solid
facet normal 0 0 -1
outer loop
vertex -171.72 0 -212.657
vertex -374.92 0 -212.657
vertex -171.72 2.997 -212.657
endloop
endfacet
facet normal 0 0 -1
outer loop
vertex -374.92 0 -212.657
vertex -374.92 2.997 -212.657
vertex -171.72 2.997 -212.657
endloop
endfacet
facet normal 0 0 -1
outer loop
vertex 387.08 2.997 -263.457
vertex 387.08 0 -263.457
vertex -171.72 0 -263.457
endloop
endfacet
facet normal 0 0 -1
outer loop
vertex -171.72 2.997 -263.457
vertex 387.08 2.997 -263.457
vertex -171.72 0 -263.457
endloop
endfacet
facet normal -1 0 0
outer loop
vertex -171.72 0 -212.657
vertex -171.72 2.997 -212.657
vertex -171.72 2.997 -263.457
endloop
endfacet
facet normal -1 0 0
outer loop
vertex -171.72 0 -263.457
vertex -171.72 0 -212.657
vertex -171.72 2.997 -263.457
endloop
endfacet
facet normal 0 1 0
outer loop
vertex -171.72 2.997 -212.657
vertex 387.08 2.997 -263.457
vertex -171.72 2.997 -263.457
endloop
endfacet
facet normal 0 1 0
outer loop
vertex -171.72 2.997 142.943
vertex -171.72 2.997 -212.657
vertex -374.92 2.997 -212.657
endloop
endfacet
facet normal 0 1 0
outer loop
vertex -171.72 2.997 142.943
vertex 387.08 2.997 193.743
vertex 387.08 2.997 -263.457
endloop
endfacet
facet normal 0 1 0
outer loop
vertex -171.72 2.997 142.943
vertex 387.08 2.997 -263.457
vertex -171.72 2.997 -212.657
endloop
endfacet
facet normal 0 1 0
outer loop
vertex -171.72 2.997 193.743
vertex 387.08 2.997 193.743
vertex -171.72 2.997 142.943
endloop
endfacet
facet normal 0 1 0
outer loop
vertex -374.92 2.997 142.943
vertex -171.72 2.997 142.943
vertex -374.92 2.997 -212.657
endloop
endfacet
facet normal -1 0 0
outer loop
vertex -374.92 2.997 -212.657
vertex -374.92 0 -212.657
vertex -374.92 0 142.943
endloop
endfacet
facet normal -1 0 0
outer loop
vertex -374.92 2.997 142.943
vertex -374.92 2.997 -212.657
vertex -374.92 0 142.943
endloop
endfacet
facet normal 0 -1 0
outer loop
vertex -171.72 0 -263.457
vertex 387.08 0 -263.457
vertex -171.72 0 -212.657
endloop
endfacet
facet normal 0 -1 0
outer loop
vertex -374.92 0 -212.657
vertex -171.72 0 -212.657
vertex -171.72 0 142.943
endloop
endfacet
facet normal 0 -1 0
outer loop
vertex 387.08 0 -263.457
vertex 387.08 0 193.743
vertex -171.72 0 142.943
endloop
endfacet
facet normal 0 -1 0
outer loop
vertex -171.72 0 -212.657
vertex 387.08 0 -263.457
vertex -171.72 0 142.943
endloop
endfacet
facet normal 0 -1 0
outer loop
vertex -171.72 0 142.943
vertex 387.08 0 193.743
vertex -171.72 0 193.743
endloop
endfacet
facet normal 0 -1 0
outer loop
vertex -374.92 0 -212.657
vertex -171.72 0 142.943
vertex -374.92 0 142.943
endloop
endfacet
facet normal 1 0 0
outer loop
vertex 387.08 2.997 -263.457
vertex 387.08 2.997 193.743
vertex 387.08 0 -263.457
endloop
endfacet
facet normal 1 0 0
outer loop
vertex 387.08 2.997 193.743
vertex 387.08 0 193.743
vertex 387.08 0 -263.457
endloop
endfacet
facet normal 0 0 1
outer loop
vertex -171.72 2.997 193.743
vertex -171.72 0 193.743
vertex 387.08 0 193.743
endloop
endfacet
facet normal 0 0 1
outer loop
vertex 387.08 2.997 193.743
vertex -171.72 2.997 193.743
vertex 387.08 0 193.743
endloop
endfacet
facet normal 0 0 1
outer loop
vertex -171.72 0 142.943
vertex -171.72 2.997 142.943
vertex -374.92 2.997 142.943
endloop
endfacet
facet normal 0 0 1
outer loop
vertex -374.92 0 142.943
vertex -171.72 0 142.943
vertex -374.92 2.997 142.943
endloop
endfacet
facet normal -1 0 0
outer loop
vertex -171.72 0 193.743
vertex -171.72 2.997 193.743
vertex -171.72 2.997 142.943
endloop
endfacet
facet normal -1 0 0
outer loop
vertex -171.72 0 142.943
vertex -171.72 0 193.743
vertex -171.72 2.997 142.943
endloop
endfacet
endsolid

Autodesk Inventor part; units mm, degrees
ref_plane "YZ Plane" through (0, 0, 0) normal (1, 0, 0) x (0, 1, 0)
ref_plane "XZ Plane" through (0, 0, 0) normal (0, 1, 0) x (-1, 0, 0)
ref_plane "XY Plane" through (0, 0, 0) normal (0, 0, 1) x (1, 0, 0)
sketch "Sketch1" plane through (0, 0, 0) normal (0, 1, 0) x (-1, 0, 0)
  line L0 (374.9202, 193.7426) -> (-387.0798, 193.7426)
  line L1 (-387.0798, 193.7426) -> (-387.0798, -263.4574)
  line L2 (-387.0798, -263.4574) -> (374.9202, -263.4574)
  line L3 (374.9202, -263.4574) -> (374.9202, 193.7426)
  point P0 (0, 0)
  dimension "d0" = 457.2
  dimension "d1" = 762
extrude "Extrusion1" add sketch "Sketch1" along normal blind 2.9972
sketch "Sketch3" plane through (0, 2.9972, 0) normal (0, 1, 0) x (1, 0, 0)
  line L0 (-374.9202, 212.6574) -> (-171.7202, 212.6574)
  line L1 (-171.7202, 212.6574) -> (-171.7202, 263.4574)
  line L2 (-171.7202, 263.4574) -> (-374.9202, 263.4574)
  line L3 (-374.9202, 263.4574) -> (-374.9202, 212.6574)
  line L4 (-374.9202, 263.4574) -> (-374.9202, -193.7426) projected
  line L5 (-374.9202, -193.7426) -> (-171.7202, -193.7426)
  line L6 (-171.7202, -193.7426) -> (-171.7202, -142.9426)
  line L7 (-171.7202, -142.9426) -> (-374.9202, -142.9426)
  line L8 (-374.9202, -142.9426) -> (-374.9202, -193.7426)
  line L9 (387.0798, 263.4574) -> (-374.9202, 263.4574) projected
  line L10 (387.0798, -193.7426) -> (387.0798, 263.4574) projected
  point P0 (0, 0)
  point P1 (-374.9202, -142.9426)
  dimension "d9" = 50.8
  dimension "d12" = 203.2
extrude "Extrusion3" cut sketch "Sketch3" against normal through all
properties part number "2021 Underbelly" material "Polycarbonate, Clear"
